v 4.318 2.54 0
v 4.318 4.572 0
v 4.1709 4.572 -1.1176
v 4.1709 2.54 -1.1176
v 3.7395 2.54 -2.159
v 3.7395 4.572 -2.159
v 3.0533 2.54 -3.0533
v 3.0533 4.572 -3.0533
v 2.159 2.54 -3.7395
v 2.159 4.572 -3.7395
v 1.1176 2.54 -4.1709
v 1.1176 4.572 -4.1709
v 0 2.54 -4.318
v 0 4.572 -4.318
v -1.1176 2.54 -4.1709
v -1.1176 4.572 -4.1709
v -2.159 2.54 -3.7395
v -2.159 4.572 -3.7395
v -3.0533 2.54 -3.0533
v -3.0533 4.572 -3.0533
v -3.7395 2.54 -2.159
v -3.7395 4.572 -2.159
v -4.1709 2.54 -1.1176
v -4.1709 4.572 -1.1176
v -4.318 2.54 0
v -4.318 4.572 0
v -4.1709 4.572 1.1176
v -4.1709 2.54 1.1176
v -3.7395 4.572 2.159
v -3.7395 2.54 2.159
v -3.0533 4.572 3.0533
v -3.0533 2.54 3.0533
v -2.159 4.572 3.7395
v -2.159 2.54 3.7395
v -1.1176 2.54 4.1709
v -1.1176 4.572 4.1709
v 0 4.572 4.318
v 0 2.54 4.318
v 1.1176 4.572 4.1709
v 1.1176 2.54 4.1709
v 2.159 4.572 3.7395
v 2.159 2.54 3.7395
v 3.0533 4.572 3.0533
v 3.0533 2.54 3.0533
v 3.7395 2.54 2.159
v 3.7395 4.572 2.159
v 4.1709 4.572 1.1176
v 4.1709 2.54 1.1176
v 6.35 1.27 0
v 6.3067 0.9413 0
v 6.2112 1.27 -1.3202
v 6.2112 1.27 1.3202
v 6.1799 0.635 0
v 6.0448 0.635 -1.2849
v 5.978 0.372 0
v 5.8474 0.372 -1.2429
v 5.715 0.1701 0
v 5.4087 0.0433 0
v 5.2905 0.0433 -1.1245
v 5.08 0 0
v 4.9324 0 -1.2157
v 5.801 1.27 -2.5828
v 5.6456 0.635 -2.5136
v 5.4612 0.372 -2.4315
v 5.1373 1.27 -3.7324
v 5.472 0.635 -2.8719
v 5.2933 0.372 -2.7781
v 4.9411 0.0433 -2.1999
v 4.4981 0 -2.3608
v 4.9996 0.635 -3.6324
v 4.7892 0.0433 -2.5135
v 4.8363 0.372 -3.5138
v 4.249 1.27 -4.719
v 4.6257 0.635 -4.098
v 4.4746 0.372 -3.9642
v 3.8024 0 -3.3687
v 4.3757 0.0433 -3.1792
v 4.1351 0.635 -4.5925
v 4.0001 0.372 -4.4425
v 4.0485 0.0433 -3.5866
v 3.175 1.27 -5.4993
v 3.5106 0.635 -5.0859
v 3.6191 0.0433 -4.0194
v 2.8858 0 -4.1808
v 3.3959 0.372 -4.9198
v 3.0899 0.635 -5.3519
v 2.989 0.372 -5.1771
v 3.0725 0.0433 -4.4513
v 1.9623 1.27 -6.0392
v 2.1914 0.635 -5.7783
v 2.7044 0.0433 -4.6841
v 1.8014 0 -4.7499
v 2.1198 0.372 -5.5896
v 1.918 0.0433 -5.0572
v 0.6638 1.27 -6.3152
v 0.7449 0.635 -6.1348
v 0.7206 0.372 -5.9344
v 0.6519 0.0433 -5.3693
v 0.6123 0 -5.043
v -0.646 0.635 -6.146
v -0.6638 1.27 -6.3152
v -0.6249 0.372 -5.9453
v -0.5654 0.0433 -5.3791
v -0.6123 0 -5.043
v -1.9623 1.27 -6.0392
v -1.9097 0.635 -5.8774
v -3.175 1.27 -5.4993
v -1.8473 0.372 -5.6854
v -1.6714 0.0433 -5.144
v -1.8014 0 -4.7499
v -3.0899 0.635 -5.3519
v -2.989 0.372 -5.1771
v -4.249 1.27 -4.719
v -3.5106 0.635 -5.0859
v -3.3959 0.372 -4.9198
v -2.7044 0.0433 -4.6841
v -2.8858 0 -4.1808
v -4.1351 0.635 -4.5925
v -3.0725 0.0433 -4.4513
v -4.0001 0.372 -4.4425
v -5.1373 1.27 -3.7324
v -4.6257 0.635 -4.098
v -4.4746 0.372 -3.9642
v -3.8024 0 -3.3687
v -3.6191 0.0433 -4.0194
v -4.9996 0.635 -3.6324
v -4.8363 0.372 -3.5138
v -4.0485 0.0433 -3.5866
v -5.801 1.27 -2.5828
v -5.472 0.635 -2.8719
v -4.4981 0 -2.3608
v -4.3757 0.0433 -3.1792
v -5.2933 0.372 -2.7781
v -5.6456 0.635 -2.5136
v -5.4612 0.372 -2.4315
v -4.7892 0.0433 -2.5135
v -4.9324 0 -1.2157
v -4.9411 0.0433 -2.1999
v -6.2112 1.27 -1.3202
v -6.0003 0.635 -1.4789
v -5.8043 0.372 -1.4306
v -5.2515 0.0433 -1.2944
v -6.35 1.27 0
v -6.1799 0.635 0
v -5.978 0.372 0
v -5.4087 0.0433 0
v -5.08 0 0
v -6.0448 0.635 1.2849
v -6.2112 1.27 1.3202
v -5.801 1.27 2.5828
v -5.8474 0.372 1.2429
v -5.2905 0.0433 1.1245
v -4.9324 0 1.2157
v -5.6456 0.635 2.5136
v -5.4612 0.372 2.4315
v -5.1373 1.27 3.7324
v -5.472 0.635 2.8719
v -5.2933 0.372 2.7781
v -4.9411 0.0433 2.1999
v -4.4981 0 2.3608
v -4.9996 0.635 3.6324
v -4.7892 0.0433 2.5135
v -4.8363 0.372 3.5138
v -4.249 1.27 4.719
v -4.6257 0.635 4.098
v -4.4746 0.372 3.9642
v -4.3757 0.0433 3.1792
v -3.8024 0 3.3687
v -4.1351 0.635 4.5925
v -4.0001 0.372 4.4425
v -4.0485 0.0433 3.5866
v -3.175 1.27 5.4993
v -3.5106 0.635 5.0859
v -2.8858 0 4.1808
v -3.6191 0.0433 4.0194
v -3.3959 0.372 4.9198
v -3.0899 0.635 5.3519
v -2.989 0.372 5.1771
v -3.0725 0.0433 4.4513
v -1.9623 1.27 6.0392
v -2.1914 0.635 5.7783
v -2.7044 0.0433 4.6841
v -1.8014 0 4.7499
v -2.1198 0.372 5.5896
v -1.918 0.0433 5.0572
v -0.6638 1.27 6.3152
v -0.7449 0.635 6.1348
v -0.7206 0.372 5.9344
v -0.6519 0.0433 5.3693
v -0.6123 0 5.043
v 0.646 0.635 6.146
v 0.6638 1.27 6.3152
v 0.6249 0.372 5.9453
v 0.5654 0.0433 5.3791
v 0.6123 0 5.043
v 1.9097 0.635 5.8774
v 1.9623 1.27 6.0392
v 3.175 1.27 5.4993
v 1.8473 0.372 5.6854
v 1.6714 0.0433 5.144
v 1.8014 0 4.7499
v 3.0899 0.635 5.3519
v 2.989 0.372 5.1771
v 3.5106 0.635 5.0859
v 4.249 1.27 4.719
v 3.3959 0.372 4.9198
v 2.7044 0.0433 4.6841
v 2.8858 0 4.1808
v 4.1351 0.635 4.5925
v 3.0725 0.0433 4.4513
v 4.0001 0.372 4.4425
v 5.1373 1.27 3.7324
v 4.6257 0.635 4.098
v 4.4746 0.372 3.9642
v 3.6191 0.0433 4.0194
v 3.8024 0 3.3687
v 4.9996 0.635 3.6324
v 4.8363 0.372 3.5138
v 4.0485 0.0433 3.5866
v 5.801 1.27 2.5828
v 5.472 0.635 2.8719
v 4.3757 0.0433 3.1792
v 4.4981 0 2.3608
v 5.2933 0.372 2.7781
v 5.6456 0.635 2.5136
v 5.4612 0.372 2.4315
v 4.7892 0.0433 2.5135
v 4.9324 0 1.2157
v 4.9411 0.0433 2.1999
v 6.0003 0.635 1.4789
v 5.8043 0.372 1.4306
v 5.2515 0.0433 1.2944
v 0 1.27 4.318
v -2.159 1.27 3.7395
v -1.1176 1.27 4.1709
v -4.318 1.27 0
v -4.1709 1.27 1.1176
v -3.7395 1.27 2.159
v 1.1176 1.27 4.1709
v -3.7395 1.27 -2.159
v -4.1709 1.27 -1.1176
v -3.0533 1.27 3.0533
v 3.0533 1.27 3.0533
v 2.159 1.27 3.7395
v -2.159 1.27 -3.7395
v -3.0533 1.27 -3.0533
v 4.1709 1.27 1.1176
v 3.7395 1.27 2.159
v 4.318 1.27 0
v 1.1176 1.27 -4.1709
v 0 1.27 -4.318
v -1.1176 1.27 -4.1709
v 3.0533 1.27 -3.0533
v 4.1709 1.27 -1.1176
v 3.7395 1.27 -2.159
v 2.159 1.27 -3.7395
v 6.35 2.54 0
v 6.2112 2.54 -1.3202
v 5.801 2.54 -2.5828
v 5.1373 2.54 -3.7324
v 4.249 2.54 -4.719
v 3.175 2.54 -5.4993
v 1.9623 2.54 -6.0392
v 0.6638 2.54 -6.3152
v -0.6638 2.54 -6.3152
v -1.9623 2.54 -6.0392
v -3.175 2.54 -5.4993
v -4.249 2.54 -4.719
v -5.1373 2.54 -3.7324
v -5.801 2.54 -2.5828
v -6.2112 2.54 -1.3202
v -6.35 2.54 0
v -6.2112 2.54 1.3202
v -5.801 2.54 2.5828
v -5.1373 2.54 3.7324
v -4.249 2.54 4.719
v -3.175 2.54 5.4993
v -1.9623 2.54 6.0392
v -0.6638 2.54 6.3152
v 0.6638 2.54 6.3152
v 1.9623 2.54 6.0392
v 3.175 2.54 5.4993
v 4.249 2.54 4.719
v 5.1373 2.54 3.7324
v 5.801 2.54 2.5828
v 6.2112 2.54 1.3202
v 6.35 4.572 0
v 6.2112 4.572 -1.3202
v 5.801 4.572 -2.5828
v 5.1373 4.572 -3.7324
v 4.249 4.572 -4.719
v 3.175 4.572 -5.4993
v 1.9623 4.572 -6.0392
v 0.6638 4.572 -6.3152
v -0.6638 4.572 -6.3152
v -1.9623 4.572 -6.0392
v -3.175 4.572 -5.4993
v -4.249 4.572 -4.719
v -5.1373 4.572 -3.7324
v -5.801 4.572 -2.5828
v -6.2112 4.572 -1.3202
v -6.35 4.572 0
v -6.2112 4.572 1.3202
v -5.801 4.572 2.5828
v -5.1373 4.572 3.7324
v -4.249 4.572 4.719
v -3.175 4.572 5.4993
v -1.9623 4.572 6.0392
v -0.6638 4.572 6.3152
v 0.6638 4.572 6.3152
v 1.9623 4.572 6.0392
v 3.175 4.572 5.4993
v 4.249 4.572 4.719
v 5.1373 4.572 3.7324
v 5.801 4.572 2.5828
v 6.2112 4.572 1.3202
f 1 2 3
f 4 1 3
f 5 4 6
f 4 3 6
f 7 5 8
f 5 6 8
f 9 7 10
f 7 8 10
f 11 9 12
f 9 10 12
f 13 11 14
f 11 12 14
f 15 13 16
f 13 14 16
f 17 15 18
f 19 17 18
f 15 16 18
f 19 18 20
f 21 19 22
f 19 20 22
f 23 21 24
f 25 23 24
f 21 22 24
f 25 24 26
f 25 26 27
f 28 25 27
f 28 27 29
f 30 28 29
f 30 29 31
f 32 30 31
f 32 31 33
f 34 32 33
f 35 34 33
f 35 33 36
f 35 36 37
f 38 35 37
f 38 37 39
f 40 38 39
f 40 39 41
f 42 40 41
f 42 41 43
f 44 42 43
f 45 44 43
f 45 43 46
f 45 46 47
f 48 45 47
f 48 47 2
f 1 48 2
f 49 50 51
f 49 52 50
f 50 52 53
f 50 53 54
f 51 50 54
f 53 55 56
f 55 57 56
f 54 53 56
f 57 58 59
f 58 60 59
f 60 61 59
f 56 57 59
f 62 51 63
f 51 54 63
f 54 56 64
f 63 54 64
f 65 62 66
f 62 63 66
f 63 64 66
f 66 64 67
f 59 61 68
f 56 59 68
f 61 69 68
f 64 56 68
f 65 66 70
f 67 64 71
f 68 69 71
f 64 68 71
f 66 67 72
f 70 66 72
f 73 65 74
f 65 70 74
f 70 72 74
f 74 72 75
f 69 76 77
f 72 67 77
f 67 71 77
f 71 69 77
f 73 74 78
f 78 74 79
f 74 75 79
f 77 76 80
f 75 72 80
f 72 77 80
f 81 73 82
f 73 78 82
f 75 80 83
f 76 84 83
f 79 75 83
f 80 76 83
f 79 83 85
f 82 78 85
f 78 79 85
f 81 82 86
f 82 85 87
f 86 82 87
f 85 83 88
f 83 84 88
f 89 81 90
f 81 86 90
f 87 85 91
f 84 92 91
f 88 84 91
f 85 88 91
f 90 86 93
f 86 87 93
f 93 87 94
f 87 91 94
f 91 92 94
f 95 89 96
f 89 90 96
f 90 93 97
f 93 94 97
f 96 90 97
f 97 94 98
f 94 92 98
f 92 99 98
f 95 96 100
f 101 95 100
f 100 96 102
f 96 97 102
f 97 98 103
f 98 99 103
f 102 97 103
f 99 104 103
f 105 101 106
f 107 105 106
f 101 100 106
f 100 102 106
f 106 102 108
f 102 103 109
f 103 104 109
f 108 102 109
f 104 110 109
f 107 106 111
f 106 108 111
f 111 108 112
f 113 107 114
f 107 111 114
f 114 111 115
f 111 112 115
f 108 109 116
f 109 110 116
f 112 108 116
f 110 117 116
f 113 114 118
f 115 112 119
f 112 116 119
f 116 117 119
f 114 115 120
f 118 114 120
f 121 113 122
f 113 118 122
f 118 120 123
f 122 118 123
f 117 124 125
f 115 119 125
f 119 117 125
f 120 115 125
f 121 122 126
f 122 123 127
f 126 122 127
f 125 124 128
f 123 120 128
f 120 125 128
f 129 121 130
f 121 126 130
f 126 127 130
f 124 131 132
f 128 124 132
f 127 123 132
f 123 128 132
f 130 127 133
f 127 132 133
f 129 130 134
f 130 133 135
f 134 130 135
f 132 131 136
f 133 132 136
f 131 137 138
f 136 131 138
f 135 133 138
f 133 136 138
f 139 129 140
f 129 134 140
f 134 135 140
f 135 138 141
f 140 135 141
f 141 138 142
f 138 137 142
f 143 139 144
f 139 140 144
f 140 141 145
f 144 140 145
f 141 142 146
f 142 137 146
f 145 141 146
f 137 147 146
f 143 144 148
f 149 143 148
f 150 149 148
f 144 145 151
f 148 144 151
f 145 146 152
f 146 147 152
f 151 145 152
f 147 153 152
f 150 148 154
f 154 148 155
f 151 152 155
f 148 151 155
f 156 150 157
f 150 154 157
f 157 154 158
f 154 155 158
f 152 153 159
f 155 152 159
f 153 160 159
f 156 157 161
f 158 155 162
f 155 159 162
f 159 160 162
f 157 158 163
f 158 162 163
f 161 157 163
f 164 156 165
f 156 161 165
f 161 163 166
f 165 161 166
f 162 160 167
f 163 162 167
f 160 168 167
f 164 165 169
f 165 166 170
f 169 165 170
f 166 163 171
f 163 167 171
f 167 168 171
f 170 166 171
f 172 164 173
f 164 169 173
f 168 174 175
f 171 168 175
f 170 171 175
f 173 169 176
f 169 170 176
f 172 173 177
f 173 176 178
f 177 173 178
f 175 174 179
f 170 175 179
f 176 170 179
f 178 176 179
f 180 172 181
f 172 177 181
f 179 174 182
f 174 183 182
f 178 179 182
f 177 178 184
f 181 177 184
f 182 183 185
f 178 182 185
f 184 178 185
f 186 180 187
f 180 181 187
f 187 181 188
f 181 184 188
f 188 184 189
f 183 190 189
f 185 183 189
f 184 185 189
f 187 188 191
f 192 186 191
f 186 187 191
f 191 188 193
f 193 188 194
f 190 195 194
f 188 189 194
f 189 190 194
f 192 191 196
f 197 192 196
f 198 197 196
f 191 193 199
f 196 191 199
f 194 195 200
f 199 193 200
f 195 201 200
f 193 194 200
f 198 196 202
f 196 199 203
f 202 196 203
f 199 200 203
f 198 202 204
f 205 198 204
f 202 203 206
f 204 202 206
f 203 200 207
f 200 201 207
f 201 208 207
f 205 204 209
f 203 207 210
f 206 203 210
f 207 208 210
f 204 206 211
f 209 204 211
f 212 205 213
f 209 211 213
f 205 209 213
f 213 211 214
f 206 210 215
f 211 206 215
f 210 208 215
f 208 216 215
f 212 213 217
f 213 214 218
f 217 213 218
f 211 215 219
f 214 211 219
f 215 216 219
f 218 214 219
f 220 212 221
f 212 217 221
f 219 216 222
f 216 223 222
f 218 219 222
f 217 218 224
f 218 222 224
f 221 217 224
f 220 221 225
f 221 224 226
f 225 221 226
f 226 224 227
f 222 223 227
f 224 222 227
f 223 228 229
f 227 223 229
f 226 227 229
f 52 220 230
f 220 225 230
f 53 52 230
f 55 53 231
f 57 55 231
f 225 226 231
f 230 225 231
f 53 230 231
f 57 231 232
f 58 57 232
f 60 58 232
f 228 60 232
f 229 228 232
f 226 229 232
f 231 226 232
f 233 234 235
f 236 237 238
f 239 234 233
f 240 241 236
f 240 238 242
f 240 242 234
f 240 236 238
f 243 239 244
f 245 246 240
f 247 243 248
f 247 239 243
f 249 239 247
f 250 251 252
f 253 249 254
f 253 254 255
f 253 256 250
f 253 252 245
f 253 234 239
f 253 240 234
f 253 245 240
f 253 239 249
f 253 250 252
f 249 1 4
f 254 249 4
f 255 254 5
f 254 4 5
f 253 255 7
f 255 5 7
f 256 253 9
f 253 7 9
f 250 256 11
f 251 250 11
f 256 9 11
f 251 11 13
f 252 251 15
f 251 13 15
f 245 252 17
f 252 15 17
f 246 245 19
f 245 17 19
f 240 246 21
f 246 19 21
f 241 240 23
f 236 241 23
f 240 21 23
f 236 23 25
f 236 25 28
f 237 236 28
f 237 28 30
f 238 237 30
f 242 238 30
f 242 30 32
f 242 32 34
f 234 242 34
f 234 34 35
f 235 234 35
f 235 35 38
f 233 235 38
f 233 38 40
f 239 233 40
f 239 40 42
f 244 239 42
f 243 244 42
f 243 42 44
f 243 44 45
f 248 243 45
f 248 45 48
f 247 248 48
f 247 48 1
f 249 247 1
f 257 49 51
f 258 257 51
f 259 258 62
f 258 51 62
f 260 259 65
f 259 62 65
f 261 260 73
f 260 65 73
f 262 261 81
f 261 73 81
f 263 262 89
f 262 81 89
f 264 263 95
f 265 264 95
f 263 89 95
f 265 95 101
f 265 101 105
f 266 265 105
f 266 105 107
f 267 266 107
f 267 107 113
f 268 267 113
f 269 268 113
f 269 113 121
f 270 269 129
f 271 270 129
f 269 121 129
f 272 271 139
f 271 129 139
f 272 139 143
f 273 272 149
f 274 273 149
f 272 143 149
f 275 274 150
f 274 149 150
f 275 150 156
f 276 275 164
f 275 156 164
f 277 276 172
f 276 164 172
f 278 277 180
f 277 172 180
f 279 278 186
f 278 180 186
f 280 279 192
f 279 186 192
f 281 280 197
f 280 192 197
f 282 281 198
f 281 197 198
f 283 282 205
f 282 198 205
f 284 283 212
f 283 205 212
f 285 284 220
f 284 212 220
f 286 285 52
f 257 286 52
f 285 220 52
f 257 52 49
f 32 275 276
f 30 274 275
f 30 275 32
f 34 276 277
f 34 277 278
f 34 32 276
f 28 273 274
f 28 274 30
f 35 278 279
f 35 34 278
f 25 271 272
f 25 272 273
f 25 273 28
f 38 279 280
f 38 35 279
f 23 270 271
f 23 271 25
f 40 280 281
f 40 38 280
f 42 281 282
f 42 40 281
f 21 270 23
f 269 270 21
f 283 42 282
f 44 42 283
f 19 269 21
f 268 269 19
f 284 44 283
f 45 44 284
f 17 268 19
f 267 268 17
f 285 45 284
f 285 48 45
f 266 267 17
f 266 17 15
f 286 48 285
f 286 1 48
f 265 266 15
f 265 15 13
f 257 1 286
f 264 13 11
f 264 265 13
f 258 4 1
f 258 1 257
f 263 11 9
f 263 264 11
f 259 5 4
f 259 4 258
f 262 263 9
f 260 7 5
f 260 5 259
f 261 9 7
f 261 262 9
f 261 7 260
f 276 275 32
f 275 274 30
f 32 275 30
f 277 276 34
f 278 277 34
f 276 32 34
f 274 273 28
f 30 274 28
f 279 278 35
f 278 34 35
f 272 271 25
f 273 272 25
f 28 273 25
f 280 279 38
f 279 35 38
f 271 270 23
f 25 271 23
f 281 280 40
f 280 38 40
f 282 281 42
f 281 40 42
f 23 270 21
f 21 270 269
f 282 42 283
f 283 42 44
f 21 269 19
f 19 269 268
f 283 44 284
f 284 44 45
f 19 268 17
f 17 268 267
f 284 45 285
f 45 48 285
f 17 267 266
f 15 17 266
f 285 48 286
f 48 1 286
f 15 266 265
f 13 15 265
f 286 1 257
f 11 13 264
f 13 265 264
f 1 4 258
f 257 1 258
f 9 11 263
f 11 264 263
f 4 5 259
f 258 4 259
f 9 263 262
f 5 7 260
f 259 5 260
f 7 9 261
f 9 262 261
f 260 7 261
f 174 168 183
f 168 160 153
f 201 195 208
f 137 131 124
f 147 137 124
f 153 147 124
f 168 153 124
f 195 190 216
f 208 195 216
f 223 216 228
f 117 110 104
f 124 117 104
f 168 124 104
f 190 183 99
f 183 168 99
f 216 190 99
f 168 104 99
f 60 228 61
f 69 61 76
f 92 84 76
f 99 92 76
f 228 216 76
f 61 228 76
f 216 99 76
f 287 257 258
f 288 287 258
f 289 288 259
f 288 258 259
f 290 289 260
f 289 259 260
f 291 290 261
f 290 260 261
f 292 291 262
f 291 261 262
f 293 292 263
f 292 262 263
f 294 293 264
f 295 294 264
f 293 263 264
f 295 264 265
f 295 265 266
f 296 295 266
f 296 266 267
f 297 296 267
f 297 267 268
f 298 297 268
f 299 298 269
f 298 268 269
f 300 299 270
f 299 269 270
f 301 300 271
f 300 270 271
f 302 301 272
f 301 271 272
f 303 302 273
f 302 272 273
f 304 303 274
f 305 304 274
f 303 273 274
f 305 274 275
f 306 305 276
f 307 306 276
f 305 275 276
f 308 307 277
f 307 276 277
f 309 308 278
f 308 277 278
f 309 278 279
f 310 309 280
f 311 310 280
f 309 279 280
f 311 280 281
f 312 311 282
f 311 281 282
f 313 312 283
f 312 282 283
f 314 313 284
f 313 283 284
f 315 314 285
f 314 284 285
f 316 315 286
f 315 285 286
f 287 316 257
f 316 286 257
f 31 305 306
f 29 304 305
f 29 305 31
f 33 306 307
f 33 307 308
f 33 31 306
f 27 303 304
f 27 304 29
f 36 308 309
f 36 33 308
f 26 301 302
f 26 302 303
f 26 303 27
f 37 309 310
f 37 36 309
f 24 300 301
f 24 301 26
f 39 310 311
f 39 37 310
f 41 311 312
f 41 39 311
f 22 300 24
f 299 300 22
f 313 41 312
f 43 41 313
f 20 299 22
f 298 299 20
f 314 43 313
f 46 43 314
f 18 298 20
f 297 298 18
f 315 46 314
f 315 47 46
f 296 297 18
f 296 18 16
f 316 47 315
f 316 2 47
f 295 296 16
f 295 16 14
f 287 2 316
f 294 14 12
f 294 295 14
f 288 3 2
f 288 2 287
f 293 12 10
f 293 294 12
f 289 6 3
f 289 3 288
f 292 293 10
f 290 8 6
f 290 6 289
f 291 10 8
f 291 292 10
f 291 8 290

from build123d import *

# Parameters (mm, degrees)
SKETCH1_R           = 6.35
BOSS_EXTRUDE1_DEPTH = 2.54
FILLET2_R           = 1.27
SKETCH2_R           = 3.429
CUT_EXTRUDE2_DEPTH  = 1.27
SKETCH3_R           = 6.35
SKETCH3_R_2         = 3.429
BOSS_EXTRUDE2_DEPTH = 2.032
SKETCH4_R           = 3.96875
CUT_EXTRUDE3_DEPTH  = 3.302
SKETCH5_R           = 4.318
CUT_EXTRUDE4_DEPTH  = 3.302


with BuildPart() as part:
    # Sketch1 → Boss-Extrude1 (new body)
    with BuildSketch(Plane(origin=(0, 0, 0), x_dir=(1, 0, 0), z_dir=(0, 1, 0))):
        Circle(SKETCH1_R)
    extrude(amount=BOSS_EXTRUDE1_DEPTH)

    # Fillet2
    fillet2_edges = [part.edges().sort_by_distance(p)[0] for p in [
        (-6.35, 0, 0),
    ]]
    fillet(fillet2_edges, radius=FILLET2_R)

    # Sketch2 → Cut-Extrude2 (cut)
    with BuildSketch(Plane(origin=(0, 2.54, 0), x_dir=(1, 0, 0), z_dir=(0, 1, 0))):
        Circle(SKETCH2_R)
    extrude(amount=-CUT_EXTRUDE2_DEPTH, mode=Mode.SUBTRACT)


with BuildPart() as body_2:
    # Sketch3 → Boss-Extrude2 (new body)
    with BuildSketch(Plane(origin=(0, 2.54, 0), x_dir=(1, 0, 0), z_dir=(0, 1, 0))):
        Circle(SKETCH3_R)
        Circle(SKETCH3_R_2, mode=Mode.SUBTRACT)
    extrude(amount=BOSS_EXTRUDE2_DEPTH)


with BuildPart() as cut_extrude3_tool:
    # Sketch4 → Cut-Extrude3 (new body)
    with BuildSketch(Plane(origin=(0, 1.27, 0), x_dir=(1, 0, 0), z_dir=(0, 1, 0))):
        Circle(SKETCH4_R)
    extrude(amount=CUT_EXTRUDE3_DEPTH)


with BuildPart() as part_1:
    add(part.part)

    # Cut-Extrude3: cut by cut_extrude3_tool
    add(cut_extrude3_tool.part, mode=Mode.SUBTRACT)


with BuildPart() as body_2_1:
    add(body_2.part)

    # Cut-Extrude3: cut by cut_extrude3_tool
    add(cut_extrude3_tool.part, mode=Mode.SUBTRACT)


with BuildPart() as cut_extrude4_tool:
    # Sketch5 → Cut-Extrude4 (new body)
    with BuildSketch(Plane(origin=(0, 4.572, 0), x_dir=(1, 0, 0), z_dir=(0, 1, 0))):
        Circle(SKETCH5_R)
    extrude(amount=-CUT_EXTRUDE4_DEPTH)


with BuildPart() as part_2:
    add(part_1.part)

    # Cut-Extrude4: cut by cut_extrude4_tool
    add(cut_extrude4_tool.part, mode=Mode.SUBTRACT)


with BuildPart() as body_2_2:
    add(body_2_1.part)

    # Cut-Extrude4: cut by cut_extrude4_tool
    add(cut_extrude4_tool.part, mode=Mode.SUBTRACT)


solid = Compound([part_2.part, body_2_2.part])
